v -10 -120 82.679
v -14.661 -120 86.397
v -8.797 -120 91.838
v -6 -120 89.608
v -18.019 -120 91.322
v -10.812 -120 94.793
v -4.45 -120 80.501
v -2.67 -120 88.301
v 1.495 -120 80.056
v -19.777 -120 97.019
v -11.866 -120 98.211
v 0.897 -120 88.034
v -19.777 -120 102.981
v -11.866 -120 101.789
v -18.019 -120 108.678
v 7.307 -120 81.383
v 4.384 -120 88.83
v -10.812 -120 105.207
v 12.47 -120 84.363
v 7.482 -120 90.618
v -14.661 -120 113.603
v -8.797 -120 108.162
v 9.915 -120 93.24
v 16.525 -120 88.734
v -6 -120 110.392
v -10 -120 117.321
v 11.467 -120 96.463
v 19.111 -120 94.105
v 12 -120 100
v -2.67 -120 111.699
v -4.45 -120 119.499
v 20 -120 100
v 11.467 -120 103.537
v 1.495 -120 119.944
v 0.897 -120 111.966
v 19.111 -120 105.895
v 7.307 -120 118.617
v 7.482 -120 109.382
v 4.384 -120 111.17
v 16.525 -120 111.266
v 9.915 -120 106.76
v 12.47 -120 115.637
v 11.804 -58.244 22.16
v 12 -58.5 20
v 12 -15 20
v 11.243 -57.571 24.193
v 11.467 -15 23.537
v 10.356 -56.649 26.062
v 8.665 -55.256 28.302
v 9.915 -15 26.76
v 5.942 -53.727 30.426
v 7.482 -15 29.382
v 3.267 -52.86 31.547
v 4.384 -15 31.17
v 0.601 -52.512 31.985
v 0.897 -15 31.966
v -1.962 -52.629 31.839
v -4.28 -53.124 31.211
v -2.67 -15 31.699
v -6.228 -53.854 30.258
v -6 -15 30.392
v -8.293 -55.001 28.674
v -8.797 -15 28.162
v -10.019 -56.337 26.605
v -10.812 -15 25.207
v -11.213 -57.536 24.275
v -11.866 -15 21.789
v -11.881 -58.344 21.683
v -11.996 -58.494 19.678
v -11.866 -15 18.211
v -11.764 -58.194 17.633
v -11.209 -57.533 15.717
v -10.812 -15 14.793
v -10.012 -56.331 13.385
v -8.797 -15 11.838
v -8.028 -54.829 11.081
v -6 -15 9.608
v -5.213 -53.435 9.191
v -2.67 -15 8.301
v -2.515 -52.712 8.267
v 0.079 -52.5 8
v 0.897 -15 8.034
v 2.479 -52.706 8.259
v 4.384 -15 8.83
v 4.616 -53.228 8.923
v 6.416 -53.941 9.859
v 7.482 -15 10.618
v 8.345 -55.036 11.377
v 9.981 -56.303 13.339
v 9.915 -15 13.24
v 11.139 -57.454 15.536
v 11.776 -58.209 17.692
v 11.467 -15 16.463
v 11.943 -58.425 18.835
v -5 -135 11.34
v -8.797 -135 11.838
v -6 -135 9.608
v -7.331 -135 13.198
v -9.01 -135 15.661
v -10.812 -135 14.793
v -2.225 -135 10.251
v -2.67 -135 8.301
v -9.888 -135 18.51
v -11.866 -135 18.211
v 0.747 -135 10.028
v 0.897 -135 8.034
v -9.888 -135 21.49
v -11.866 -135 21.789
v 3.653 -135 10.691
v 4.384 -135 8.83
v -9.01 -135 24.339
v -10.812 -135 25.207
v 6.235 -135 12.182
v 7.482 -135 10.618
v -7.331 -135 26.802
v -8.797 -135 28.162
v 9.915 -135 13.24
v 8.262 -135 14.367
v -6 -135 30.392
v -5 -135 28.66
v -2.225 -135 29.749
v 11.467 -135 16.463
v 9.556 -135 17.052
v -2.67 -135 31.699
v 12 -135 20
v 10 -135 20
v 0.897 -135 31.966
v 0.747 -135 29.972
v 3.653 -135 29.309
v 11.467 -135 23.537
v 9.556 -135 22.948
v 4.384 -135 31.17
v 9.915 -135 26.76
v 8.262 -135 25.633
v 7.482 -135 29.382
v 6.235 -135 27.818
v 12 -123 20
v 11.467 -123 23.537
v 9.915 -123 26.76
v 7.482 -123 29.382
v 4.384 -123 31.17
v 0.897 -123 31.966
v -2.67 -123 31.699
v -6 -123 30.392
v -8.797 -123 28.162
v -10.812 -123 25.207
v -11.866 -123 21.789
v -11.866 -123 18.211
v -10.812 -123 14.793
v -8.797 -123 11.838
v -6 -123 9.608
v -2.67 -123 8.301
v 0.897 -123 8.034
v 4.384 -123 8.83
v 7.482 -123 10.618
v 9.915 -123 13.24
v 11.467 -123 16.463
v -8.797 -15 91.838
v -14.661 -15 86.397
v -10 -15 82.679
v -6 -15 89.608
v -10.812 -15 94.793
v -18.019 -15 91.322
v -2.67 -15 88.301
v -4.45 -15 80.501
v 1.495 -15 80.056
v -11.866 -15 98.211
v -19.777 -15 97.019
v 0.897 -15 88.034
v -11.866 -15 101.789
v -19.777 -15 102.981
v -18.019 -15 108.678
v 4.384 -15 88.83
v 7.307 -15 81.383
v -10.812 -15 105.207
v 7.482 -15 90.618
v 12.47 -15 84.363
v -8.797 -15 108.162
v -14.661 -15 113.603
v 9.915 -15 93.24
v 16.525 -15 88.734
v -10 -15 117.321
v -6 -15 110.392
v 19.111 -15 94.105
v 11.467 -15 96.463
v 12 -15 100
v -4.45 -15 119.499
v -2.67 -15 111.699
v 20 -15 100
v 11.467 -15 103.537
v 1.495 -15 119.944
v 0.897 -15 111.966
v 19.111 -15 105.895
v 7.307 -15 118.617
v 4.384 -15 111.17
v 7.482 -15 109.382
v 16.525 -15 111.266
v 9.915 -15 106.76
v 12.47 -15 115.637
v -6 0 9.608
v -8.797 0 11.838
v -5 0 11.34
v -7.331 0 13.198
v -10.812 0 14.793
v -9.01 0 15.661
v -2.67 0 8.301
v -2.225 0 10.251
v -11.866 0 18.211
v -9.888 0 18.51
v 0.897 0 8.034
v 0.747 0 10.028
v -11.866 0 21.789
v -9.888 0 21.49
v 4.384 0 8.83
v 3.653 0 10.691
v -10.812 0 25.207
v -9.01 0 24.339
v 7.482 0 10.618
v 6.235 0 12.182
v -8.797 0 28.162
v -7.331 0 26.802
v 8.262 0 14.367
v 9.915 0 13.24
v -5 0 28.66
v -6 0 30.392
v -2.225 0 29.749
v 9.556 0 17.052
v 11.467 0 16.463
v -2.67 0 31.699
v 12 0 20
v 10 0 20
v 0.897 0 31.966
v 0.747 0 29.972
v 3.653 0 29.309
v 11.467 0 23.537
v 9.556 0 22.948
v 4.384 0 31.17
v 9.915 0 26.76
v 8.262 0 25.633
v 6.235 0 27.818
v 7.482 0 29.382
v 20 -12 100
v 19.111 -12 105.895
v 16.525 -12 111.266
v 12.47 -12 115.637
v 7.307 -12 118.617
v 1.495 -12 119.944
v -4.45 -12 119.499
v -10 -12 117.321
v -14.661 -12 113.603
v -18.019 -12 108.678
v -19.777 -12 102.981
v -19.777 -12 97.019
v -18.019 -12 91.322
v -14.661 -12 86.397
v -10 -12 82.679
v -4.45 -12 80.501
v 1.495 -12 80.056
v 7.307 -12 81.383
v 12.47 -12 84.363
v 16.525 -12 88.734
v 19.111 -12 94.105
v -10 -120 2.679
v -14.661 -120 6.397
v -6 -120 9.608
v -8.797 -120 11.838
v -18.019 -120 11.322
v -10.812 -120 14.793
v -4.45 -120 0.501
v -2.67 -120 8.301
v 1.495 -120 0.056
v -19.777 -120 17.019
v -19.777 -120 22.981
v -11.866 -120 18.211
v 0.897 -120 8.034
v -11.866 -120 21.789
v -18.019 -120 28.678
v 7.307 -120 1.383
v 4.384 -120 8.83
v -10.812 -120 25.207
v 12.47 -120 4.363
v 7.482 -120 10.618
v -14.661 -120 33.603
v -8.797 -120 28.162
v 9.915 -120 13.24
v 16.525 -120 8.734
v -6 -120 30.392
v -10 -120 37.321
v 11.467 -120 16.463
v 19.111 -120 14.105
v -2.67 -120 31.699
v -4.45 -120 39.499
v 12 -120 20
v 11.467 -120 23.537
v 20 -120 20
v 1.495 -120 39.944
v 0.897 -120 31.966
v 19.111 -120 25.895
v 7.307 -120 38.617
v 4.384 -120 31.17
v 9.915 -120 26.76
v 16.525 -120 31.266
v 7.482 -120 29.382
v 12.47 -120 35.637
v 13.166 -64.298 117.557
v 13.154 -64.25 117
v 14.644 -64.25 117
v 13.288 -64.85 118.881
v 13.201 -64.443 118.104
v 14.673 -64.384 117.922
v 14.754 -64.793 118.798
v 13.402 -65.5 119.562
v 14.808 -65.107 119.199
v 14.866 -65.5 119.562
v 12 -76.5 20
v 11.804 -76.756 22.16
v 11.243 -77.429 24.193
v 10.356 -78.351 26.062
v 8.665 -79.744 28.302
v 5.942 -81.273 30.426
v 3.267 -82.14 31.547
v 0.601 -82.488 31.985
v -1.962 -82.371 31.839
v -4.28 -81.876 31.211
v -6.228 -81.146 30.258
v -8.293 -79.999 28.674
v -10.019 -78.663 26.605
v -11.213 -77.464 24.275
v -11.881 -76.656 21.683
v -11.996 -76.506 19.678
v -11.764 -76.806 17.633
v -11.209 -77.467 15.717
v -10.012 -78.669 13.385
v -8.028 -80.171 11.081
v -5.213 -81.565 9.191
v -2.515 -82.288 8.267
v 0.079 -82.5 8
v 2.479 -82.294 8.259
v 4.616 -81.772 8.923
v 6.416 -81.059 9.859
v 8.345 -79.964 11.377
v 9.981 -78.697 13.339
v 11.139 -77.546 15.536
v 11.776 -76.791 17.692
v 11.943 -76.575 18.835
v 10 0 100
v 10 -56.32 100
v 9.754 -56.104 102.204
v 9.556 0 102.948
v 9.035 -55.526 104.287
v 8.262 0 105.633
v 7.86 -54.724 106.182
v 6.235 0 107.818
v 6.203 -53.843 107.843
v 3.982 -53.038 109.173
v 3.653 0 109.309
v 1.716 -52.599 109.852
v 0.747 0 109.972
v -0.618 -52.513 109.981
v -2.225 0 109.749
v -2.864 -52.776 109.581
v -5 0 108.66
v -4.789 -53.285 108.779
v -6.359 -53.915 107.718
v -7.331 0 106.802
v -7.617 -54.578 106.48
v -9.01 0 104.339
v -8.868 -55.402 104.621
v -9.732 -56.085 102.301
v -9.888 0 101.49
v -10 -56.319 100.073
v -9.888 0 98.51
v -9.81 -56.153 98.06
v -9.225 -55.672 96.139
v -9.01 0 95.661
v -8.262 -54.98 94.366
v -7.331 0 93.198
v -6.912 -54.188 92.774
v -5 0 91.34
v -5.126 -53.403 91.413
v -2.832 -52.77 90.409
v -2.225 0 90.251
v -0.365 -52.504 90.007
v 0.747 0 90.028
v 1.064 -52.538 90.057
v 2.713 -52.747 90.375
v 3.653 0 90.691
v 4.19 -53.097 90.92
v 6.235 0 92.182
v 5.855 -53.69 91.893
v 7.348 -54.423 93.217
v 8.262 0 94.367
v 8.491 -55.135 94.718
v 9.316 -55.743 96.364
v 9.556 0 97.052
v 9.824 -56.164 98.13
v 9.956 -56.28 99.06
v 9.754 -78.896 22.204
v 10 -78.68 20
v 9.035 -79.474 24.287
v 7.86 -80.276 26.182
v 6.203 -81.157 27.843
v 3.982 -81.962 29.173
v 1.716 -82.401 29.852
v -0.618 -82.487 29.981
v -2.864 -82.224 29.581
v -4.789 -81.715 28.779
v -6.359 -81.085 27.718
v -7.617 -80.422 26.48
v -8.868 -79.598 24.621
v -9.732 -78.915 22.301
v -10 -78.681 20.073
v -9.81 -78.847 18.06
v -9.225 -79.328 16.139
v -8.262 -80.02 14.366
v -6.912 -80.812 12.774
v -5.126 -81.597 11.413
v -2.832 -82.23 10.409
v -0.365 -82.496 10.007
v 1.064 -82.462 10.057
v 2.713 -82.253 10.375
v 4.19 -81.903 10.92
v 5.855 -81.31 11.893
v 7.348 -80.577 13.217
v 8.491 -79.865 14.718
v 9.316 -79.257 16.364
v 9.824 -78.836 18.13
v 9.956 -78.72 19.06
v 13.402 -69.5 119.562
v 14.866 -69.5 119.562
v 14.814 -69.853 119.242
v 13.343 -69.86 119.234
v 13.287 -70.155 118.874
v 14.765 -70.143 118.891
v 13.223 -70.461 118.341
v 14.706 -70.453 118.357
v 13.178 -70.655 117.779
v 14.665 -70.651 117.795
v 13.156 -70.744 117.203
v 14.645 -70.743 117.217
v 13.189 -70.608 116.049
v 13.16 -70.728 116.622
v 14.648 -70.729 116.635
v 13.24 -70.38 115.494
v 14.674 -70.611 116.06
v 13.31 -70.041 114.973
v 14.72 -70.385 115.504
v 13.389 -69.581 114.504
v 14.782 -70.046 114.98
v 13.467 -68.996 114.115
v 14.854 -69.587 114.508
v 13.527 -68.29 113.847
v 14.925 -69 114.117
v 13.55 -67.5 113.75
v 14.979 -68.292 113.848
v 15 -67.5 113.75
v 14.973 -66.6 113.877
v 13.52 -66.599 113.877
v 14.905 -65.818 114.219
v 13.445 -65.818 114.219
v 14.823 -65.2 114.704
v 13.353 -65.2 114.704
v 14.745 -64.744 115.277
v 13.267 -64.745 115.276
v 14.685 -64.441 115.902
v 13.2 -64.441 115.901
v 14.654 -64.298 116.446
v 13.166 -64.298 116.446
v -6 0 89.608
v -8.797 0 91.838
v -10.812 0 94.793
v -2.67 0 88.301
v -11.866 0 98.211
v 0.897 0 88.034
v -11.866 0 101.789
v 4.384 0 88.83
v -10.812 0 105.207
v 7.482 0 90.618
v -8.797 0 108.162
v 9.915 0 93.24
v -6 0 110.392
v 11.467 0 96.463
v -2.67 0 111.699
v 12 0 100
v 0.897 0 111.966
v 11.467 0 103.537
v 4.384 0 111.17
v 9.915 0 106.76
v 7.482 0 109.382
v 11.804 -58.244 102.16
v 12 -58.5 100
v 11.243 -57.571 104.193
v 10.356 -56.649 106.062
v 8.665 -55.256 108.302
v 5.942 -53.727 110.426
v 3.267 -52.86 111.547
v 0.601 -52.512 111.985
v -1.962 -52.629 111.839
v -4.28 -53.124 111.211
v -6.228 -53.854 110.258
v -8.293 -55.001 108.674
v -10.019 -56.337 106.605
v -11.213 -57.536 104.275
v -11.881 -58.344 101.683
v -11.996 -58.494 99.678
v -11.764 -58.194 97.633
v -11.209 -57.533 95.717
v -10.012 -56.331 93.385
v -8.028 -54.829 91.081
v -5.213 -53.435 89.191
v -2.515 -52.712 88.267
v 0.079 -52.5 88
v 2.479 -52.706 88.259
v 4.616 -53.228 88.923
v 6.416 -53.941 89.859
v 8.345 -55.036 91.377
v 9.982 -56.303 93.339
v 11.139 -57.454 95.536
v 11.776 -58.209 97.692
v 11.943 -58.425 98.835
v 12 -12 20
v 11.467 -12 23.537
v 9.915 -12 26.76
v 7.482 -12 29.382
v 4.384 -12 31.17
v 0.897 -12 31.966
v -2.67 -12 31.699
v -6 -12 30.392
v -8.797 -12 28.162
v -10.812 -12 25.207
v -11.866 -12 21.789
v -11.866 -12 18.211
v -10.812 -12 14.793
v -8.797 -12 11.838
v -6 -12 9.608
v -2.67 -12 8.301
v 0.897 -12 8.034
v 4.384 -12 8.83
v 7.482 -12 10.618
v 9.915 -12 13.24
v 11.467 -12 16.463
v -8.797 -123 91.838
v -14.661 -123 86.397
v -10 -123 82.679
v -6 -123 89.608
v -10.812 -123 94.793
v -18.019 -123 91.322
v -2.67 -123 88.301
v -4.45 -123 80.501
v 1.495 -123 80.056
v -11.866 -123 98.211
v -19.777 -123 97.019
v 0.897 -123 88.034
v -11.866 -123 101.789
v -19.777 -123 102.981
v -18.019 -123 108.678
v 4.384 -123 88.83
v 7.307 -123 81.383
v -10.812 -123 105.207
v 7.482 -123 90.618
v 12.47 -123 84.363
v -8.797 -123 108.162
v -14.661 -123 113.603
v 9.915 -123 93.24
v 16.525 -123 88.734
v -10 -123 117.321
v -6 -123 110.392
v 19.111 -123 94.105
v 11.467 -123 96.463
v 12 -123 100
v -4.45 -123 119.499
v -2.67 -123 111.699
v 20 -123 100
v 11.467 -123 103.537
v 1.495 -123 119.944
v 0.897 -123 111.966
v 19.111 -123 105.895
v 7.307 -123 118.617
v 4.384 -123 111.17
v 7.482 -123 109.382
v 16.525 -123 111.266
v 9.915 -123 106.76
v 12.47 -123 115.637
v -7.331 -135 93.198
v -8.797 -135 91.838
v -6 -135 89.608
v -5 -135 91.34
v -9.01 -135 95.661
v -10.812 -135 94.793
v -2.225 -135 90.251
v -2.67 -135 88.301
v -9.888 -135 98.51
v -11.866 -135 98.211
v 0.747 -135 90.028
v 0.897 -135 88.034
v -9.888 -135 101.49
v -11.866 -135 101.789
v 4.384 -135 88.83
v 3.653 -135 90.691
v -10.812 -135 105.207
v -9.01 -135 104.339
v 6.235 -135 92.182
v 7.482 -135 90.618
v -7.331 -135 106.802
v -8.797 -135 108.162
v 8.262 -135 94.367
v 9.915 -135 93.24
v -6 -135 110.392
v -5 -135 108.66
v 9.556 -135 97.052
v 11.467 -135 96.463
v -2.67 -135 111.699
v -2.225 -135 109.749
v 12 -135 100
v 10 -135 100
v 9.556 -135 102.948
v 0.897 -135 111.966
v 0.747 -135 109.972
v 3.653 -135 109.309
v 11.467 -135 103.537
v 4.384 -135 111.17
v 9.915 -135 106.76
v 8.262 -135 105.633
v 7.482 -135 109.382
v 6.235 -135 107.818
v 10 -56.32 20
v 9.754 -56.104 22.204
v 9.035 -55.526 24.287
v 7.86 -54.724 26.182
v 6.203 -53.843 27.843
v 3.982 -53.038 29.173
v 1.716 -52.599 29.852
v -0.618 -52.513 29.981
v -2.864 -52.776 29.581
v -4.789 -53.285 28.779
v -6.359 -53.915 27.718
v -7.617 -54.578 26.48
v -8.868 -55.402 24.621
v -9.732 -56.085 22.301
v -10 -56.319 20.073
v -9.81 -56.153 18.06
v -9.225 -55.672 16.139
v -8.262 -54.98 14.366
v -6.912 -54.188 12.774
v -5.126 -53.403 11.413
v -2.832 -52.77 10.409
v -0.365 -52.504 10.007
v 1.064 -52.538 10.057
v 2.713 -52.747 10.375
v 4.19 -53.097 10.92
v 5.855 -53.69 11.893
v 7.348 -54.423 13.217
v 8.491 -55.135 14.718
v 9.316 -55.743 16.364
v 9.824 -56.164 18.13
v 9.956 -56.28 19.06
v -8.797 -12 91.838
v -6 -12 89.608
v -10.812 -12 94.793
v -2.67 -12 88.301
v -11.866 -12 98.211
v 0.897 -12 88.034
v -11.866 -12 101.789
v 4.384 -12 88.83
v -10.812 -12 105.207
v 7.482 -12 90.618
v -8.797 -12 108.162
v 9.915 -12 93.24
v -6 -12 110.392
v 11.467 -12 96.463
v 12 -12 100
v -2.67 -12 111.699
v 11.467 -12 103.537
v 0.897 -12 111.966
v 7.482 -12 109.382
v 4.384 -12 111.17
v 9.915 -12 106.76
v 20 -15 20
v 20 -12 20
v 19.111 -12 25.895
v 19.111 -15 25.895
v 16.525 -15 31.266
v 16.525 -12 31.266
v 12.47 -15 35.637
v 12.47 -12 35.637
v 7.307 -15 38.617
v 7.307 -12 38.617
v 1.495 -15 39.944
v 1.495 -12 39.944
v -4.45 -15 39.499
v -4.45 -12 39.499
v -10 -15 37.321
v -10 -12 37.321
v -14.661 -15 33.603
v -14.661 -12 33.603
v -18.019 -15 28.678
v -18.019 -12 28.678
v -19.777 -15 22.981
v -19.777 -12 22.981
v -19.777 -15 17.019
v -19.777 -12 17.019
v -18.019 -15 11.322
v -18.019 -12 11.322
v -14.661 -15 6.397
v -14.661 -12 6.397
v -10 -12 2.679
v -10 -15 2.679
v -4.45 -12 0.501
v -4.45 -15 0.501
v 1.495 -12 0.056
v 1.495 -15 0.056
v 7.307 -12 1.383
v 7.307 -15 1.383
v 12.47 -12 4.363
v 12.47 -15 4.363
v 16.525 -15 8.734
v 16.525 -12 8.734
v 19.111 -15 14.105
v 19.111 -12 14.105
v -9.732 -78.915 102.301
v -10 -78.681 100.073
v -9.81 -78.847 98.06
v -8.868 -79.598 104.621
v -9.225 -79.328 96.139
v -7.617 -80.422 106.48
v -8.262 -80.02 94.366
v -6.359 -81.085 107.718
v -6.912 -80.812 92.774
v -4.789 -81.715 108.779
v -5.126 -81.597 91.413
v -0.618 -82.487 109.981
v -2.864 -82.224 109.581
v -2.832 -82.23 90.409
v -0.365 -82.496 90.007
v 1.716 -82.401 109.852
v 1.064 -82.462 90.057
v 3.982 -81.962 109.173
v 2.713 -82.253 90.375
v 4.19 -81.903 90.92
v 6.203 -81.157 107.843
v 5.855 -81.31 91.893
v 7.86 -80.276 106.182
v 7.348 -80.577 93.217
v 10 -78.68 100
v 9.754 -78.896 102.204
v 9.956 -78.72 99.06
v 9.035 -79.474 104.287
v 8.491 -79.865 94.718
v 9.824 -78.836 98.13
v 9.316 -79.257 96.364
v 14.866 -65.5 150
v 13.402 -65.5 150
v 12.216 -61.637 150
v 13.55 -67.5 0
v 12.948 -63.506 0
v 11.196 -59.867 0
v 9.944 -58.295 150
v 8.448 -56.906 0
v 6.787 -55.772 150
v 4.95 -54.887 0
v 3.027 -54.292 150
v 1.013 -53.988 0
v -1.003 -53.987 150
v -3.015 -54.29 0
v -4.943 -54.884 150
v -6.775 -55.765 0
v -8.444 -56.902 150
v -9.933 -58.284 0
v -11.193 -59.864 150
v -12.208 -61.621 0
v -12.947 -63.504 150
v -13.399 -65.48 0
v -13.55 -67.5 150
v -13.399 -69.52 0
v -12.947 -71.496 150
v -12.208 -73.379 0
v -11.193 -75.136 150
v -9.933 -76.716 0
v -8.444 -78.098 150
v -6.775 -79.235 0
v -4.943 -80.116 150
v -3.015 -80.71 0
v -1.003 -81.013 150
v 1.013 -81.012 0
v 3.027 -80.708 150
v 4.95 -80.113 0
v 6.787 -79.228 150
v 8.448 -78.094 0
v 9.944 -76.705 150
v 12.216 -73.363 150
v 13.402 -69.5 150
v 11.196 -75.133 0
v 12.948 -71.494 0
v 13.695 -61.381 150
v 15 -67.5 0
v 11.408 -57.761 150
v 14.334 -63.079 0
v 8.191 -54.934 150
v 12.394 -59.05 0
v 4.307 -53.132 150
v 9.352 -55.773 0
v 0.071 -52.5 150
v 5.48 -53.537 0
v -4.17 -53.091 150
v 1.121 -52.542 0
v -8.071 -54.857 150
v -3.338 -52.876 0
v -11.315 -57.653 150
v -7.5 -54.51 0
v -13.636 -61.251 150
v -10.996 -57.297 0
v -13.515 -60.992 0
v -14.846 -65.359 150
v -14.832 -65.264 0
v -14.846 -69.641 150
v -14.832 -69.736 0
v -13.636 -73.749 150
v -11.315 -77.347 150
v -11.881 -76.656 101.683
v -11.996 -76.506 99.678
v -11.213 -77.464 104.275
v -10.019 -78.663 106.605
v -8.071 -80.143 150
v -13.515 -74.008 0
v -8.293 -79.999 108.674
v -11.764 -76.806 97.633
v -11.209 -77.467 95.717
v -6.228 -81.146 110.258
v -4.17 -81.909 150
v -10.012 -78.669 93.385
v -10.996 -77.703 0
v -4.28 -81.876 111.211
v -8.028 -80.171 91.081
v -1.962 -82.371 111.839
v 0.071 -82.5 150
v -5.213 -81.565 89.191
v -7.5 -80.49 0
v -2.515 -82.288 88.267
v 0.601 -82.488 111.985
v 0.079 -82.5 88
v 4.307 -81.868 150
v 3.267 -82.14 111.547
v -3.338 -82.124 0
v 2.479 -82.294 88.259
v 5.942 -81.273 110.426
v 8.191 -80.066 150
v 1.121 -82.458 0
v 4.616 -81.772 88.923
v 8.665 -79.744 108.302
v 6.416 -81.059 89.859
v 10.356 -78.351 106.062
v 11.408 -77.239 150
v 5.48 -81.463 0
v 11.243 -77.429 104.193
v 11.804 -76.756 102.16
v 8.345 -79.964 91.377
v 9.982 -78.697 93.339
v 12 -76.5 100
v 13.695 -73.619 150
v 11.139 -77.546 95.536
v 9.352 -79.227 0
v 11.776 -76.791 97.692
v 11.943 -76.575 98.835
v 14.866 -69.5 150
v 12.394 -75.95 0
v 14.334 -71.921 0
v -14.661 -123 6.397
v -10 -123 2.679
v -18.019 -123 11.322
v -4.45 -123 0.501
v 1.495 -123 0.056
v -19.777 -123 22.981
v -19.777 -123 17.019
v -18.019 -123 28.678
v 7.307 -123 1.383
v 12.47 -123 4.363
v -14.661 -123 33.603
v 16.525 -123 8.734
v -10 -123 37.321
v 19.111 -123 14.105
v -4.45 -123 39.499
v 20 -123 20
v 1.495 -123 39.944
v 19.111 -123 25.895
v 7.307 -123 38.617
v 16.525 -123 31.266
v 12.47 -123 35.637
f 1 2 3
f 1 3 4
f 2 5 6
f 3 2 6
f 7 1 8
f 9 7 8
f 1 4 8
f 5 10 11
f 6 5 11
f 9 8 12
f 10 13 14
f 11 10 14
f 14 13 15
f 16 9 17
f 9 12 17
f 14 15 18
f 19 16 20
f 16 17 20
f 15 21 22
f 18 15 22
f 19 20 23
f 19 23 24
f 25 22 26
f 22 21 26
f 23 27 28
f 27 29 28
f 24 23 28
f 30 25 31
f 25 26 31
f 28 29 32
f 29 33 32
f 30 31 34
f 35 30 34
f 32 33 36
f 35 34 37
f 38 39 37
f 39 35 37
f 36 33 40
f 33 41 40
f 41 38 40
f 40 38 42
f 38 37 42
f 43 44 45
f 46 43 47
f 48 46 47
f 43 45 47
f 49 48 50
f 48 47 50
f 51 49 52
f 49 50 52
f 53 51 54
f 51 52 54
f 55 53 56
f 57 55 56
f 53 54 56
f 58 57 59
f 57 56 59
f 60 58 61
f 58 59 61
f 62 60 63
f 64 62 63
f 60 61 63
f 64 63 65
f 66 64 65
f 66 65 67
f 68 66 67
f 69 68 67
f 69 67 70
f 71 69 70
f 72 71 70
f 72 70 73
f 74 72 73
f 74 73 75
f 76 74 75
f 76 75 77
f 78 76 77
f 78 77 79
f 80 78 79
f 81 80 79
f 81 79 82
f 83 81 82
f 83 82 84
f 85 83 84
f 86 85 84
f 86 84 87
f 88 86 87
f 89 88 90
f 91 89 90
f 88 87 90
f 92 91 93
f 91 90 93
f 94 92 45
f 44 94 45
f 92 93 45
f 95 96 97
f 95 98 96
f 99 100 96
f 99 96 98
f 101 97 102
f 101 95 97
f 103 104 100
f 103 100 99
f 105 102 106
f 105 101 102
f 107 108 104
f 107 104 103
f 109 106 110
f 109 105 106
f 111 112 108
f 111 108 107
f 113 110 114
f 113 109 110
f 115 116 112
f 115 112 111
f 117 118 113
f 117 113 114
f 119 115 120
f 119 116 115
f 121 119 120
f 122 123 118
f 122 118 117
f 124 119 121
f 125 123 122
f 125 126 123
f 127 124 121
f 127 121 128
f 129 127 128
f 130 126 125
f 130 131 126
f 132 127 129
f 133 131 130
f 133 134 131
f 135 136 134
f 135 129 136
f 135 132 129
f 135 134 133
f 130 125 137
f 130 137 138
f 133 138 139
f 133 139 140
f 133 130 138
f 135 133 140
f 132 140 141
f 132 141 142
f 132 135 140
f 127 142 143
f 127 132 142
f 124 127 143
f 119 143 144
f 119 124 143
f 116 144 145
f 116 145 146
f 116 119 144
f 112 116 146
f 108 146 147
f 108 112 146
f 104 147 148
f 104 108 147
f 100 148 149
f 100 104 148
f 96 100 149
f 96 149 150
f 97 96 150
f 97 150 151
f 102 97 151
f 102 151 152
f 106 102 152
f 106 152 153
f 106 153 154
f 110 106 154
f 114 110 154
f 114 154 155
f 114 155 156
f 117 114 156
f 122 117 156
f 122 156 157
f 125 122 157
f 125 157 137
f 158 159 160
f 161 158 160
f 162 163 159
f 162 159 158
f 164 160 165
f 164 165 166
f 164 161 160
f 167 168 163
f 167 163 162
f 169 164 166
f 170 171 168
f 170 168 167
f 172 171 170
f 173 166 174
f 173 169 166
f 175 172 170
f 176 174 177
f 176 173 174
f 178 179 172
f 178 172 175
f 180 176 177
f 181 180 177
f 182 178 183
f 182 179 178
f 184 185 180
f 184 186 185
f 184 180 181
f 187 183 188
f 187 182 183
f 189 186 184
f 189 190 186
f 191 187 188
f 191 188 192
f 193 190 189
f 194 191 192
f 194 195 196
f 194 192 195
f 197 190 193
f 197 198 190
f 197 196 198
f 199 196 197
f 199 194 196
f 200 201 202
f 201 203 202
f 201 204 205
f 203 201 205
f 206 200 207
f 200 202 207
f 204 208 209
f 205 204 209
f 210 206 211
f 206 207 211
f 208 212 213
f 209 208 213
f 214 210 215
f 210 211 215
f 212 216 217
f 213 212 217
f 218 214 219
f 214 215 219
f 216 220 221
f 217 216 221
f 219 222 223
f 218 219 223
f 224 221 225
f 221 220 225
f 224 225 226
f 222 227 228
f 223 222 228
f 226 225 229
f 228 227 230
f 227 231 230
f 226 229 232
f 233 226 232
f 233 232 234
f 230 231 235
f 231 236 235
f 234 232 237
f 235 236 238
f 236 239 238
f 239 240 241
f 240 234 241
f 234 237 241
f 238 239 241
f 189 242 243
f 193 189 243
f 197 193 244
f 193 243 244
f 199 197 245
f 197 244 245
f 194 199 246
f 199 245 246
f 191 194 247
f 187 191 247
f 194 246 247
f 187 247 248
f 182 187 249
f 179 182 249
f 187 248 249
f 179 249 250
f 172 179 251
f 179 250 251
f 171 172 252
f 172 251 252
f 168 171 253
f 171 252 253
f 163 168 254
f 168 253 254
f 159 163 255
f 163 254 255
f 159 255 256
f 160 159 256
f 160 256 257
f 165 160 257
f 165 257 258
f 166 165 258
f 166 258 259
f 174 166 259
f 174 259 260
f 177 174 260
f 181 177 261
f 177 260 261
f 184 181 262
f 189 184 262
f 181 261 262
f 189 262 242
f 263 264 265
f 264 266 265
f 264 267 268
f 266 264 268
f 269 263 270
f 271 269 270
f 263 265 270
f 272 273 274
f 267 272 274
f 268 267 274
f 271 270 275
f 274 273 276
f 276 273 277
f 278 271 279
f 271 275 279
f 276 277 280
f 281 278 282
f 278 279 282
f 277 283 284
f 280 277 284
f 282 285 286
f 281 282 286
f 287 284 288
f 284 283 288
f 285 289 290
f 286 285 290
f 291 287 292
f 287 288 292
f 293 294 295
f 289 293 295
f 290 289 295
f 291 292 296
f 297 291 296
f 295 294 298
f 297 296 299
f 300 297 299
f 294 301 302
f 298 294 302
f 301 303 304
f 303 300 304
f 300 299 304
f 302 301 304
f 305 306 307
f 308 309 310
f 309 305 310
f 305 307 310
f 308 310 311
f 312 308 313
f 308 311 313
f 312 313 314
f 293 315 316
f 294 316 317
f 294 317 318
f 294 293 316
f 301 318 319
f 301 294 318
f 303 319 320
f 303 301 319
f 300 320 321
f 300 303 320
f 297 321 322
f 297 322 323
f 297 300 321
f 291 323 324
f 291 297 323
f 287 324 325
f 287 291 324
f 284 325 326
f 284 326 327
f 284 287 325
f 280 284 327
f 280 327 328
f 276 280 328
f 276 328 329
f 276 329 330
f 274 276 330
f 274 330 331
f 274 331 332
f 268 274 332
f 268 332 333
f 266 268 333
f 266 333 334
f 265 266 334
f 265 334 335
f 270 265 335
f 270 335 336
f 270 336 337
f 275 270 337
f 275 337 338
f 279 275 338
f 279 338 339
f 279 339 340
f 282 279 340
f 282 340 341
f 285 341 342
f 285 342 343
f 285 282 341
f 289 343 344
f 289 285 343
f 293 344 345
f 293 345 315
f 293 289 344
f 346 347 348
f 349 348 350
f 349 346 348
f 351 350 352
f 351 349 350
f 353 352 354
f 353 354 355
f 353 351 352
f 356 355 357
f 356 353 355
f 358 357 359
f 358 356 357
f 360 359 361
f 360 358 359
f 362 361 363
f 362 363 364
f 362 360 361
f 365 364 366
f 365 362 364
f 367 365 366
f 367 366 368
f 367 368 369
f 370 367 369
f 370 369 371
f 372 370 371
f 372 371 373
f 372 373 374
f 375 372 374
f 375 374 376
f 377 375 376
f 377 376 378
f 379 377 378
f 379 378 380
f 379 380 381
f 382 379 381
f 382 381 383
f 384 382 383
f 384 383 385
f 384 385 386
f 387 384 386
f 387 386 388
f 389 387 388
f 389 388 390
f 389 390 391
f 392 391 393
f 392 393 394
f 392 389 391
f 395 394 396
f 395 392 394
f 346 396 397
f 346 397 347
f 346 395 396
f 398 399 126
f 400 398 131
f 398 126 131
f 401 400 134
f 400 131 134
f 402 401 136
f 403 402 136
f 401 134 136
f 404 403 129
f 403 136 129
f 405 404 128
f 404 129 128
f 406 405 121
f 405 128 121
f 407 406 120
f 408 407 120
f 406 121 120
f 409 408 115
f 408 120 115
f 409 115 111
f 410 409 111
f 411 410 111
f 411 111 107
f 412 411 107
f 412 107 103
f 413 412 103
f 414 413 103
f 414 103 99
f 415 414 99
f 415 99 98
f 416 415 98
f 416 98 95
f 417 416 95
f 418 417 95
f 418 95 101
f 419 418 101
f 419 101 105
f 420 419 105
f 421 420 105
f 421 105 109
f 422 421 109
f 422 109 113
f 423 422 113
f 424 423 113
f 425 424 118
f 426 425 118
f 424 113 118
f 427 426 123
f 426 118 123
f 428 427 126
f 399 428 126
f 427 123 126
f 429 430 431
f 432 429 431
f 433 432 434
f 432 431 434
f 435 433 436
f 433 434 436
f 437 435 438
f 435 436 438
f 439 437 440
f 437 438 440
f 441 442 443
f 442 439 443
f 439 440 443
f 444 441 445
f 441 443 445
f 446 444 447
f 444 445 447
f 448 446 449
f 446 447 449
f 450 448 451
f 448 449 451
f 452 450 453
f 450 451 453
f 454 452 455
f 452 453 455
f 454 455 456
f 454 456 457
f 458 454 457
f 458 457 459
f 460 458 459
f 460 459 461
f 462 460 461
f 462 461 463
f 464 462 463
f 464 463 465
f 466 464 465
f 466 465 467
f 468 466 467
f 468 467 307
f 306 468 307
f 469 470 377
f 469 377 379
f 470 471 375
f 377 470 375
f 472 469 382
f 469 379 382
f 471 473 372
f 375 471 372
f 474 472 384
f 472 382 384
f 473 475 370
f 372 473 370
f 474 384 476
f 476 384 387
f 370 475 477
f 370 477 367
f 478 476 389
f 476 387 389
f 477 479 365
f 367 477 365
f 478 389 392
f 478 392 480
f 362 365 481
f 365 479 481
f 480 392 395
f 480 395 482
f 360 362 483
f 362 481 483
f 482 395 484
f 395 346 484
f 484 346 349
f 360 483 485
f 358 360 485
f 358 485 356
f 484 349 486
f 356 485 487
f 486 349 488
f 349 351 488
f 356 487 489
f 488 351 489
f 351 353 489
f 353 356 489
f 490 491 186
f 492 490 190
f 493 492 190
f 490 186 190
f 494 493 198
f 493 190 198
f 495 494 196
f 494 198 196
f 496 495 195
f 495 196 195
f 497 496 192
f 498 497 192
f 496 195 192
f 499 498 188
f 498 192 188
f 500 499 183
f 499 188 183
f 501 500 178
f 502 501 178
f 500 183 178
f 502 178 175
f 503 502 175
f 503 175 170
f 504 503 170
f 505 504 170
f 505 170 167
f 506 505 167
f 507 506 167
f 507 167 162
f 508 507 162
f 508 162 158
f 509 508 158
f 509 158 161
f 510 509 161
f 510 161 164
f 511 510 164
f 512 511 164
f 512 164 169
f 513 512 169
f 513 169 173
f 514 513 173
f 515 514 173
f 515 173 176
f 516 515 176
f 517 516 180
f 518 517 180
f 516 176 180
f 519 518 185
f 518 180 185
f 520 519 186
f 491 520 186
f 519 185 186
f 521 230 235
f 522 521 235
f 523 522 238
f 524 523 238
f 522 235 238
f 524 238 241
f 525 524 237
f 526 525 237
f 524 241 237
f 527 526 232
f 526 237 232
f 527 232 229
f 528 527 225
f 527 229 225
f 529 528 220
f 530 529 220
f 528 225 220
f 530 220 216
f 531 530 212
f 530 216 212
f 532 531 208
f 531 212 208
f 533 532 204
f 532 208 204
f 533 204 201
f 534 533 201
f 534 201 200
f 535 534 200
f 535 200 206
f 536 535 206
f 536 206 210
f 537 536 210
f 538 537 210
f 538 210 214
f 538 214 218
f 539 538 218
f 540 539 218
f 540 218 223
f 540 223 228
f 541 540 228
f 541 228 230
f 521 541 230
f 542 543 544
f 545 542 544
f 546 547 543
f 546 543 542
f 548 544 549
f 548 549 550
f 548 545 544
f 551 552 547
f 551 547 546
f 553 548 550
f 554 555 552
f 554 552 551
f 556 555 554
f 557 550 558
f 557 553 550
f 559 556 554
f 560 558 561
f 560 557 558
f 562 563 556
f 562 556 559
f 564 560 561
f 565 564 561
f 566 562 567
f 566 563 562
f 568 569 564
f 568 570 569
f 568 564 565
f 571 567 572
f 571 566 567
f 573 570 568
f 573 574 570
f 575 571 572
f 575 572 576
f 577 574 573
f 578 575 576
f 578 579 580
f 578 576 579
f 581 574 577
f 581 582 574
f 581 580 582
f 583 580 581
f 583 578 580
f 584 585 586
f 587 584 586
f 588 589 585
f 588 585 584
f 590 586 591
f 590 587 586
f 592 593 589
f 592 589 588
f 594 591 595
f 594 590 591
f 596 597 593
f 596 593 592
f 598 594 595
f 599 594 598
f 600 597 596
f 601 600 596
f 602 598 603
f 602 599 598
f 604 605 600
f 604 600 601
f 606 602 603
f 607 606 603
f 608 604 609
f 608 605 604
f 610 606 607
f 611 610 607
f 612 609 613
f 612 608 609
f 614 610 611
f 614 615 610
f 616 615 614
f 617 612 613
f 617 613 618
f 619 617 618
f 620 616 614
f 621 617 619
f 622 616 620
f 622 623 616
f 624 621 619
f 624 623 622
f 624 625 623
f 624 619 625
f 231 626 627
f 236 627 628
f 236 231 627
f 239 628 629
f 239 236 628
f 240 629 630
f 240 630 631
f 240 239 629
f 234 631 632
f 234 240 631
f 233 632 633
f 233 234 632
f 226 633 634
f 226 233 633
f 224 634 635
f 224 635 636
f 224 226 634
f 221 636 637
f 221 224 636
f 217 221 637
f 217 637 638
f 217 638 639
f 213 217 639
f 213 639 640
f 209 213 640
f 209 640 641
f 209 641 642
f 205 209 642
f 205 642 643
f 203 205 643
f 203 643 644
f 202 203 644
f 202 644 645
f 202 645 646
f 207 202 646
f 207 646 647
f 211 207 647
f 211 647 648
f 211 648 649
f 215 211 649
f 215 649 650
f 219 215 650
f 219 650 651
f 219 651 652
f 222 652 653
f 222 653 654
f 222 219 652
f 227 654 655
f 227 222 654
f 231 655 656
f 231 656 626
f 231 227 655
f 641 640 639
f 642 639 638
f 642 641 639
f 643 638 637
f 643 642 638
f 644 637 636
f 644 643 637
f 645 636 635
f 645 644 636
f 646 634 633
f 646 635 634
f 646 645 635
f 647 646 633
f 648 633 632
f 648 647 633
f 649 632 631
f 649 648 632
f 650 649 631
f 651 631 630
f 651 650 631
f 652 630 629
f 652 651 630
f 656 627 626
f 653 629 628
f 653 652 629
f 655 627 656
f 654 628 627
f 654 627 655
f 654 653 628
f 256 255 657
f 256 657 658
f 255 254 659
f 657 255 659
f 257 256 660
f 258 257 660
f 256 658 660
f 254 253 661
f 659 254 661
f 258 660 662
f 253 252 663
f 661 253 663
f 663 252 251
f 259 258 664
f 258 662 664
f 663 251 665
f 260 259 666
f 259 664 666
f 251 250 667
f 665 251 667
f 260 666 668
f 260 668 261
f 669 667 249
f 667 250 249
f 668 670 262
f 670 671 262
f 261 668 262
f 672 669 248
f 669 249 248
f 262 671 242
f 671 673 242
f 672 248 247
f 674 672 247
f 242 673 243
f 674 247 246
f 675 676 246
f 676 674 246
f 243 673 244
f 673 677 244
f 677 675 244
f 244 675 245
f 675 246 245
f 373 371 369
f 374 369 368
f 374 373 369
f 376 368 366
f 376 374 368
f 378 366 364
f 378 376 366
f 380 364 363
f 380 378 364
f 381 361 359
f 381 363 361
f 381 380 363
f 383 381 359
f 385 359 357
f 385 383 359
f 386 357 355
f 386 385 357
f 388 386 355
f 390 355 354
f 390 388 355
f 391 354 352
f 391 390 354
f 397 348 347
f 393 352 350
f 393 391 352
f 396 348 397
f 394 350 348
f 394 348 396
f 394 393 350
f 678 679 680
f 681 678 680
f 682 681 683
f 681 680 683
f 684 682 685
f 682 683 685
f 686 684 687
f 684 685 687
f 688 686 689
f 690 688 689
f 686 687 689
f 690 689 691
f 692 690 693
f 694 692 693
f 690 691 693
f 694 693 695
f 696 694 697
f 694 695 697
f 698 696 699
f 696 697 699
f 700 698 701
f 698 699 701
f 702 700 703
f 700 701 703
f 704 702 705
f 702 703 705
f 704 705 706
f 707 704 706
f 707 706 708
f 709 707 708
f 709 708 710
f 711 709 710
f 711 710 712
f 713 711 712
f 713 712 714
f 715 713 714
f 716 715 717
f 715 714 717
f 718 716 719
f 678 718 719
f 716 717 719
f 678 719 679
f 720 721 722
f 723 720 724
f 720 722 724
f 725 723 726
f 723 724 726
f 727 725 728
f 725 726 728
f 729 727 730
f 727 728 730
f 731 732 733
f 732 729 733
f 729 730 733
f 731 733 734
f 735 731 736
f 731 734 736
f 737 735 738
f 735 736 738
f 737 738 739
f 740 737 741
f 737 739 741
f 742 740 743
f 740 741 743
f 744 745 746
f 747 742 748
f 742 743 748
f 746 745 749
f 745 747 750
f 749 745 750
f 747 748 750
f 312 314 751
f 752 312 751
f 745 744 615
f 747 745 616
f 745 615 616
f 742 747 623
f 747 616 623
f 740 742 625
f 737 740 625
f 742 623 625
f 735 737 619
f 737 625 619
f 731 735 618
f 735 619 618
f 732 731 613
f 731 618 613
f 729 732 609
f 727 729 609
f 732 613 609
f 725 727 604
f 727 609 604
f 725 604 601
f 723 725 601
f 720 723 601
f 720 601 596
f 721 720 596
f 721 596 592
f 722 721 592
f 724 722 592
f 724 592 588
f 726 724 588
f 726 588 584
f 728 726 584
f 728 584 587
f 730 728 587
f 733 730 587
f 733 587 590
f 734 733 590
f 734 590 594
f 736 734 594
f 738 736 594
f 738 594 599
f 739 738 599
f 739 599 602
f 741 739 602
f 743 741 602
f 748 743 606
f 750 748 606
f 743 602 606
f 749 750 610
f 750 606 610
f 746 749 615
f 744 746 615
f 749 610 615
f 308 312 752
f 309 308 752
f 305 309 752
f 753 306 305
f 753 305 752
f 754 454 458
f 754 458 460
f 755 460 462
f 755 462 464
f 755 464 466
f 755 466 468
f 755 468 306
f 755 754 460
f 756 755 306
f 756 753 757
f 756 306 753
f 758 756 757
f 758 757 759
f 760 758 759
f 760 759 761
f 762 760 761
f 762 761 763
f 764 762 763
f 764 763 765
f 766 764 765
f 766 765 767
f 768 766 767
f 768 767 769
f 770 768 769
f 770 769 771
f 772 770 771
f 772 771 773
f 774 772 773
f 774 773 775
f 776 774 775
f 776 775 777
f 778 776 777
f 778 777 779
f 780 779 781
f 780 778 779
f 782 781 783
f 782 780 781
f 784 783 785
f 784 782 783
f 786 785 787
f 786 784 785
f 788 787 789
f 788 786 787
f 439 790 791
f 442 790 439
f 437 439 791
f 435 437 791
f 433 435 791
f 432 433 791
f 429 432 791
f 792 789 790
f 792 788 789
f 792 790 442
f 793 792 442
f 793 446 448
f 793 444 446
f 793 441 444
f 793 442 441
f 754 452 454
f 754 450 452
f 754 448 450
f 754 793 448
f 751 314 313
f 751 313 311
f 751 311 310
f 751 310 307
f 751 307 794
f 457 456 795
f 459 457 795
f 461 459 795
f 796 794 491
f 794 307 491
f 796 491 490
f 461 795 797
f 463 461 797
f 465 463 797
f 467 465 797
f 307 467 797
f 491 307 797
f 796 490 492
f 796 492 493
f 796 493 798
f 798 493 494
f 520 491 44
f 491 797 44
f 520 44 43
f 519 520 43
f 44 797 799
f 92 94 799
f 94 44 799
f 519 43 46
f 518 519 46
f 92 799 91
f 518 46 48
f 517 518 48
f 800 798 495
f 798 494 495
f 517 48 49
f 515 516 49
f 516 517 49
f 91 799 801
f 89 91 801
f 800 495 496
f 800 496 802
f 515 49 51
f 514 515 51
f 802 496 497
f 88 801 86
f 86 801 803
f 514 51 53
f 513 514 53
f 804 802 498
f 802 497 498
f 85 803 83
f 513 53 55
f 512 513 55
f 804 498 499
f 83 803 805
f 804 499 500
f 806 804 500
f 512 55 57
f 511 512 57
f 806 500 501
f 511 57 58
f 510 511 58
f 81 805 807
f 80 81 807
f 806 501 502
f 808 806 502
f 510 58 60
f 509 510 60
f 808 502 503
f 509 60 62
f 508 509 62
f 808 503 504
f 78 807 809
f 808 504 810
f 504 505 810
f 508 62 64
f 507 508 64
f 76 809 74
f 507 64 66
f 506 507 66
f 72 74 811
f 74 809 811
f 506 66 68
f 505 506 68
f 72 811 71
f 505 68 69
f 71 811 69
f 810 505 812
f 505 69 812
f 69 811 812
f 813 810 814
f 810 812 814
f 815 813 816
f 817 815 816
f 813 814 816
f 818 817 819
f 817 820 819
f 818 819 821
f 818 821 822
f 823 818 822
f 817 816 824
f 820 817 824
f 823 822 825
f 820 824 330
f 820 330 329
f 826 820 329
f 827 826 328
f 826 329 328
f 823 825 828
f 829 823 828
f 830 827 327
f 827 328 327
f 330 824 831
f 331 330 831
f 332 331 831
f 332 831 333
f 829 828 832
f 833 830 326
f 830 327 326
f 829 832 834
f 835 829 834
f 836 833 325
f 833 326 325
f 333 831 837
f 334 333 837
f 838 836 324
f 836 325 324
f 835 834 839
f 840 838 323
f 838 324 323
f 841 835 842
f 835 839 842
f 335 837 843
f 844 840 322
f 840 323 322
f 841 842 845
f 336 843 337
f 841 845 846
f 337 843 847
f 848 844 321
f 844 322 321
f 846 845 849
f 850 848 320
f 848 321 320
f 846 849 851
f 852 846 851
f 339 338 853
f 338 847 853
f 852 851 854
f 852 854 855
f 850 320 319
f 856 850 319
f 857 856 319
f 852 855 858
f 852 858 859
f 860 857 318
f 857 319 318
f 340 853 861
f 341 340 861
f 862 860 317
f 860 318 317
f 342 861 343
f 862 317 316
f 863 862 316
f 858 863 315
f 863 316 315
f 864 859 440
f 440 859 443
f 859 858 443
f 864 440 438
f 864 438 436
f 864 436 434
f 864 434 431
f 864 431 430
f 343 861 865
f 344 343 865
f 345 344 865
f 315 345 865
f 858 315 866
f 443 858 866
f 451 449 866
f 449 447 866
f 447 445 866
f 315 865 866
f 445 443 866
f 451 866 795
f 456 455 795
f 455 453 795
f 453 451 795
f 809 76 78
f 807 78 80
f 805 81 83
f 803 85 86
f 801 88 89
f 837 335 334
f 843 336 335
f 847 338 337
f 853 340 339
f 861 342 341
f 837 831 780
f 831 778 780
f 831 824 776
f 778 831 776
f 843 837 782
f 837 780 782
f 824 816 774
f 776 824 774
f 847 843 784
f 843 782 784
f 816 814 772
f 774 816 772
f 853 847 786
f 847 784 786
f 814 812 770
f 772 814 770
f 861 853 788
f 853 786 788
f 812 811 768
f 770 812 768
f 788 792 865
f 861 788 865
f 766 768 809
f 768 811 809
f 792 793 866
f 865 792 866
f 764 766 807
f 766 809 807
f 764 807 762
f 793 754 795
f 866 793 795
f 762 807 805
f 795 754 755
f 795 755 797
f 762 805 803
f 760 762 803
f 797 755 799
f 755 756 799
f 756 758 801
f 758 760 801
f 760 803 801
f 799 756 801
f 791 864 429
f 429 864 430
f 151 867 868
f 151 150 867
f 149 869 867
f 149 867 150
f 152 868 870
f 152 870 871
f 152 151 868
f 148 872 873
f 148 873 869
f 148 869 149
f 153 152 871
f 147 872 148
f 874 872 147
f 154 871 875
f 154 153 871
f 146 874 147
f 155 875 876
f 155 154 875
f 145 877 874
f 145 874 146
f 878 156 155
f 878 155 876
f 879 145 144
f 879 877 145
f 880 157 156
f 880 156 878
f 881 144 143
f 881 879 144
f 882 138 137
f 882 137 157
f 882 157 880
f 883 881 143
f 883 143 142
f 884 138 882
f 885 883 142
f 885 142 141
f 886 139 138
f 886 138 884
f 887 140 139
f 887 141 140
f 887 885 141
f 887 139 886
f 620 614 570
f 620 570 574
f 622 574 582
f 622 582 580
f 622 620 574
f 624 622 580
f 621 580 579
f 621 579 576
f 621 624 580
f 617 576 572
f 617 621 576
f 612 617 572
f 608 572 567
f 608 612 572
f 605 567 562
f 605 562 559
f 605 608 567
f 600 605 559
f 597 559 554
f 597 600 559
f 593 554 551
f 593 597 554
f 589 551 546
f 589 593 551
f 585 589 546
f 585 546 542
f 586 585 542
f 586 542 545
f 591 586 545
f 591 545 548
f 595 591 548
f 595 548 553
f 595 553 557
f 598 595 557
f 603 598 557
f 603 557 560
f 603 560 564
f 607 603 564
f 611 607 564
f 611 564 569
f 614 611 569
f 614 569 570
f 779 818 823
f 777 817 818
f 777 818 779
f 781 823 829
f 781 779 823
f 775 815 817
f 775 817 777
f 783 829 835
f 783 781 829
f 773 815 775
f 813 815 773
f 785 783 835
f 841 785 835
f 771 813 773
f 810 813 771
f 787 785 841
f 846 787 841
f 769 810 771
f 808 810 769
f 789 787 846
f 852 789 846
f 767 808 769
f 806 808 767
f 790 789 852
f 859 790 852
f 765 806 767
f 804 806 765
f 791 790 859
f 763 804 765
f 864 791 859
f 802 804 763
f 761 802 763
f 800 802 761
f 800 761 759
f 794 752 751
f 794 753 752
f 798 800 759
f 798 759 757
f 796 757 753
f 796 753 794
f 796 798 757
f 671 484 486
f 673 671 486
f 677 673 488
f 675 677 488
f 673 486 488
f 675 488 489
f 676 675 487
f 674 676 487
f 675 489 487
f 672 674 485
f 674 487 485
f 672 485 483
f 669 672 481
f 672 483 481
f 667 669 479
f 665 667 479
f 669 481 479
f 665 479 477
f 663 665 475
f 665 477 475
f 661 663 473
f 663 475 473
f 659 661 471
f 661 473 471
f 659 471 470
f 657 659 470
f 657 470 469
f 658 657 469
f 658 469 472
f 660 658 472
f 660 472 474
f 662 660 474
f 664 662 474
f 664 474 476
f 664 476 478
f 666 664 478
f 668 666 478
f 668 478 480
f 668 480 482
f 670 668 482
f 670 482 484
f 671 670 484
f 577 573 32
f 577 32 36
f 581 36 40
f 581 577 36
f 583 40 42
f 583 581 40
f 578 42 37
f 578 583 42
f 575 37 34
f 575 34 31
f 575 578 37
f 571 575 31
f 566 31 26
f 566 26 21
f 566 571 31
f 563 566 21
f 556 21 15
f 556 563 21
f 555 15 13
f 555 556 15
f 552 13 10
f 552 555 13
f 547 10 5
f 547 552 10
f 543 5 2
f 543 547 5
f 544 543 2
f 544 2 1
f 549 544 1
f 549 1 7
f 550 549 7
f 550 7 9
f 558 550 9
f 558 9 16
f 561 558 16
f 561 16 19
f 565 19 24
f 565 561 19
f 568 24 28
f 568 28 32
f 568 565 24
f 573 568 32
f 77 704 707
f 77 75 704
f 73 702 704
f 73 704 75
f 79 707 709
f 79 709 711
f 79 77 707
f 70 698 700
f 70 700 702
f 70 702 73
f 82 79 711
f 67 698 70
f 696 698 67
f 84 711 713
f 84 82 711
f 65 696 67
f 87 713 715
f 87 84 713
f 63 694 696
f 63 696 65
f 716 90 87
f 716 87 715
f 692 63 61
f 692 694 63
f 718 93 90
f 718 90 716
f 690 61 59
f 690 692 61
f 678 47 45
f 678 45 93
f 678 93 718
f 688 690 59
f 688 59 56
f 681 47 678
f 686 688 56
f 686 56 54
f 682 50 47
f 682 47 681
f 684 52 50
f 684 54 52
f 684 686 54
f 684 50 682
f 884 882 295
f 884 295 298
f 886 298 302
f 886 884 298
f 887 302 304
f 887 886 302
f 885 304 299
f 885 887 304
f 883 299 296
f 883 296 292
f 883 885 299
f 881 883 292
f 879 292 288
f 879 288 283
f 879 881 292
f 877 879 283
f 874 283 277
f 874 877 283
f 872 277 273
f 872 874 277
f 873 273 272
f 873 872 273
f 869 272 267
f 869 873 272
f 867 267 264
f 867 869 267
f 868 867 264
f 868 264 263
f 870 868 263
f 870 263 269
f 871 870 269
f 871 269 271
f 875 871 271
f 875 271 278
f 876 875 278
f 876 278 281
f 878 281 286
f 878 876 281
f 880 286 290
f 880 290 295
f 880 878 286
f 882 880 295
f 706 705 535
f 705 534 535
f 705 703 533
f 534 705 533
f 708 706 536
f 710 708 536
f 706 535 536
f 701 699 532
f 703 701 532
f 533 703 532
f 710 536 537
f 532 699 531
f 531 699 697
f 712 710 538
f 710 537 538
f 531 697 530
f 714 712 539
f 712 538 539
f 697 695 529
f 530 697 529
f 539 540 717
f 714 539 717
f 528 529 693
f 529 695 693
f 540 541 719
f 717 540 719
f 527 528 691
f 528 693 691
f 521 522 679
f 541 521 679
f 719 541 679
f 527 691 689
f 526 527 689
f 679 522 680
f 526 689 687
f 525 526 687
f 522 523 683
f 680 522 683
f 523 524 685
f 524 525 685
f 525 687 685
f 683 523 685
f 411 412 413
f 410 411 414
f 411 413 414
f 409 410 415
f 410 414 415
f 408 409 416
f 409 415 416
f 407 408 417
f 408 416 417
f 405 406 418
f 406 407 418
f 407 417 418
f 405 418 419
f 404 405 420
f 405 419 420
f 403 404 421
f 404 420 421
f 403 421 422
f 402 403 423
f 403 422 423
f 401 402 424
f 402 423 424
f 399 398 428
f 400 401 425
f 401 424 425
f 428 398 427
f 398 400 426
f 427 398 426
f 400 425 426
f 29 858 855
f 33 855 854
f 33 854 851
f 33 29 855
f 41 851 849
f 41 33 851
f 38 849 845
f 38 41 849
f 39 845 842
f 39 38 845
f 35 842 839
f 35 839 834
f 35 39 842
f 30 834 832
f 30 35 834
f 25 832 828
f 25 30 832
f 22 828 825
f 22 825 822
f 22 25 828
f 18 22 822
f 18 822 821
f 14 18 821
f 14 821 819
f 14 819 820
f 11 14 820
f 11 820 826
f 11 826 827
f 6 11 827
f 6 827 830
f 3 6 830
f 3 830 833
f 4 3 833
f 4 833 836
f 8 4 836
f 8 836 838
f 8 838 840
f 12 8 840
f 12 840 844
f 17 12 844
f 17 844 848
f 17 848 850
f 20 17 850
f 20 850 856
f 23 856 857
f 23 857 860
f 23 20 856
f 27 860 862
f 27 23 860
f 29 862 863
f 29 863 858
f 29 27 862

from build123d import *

# Parameters (mm, degrees)
F4_R      = 15
F4_R_2    = 13.55
F6_DEPTH  = 150
F5_R      = 12
F5_R_2    = 10
F10_DEPTH = 4
F11_START = -12
F5_R_3    = 20
F11_DEPTH = 3


with BuildPart() as f6:
    # F4 (on Top) → F6 (new body, through all)
    with BuildSketch(Plane.XY):
        with Locations((0, -67.5)):
            Circle(F4_R)
        with Locations((0, -67.5)):
            Circle(F4_R_2, mode=Mode.SUBTRACT)
    extrude(amount=F6_DEPTH)

    # F5 (on offset) → F7 (join, up to the next surface of F6)
    with BuildSketch(Plane.XZ.offset(135)):
        with Locations((0, 100)):
            Circle(F5_R)
        with Locations((0, 100)):
            Circle(F5_R_2, mode=Mode.SUBTRACT)
        with Locations((0, 20)):
            Circle(F5_R)
        with Locations((0, 20)):
            Circle(F5_R_2, mode=Mode.SUBTRACT)
    extrude(until=Until.NEXT, dir=(0, 1, 0))

    # F9 (on plane+point) → F10 (cut)
    with BuildSketch(Plane.YZ.offset(15)):
        with BuildLine():
            ThreePointArc((-69.5, 119.5617376915), (-67.5, 120.25), (-65.5, 119.5617376915))
            Line((-65.5, 119.5617376915), (-65.5, 150))
            Line((-65.5, 150), (-69.5, 150))
            Line((-69.5, 150), (-69.5, 119.5617376915))
        make_face()
        with BuildLine():
            ThreePointArc((-69.5, 119.5617376915), (-68.9252192814, 114.0791696386), (-64.25, 117))
            ThreePointArc((-64.25, 117), (-64.5791696386, 118.4252192814), (-65.5, 119.5617376915))
            Line((-65.5, 119.5617376915), (-65.5, 117))
            Line((-65.5, 117), (-69.5, 117))
            Line((-69.5, 117), (-69.5, 119.5617376915))
        make_face()
        with BuildLine():
            Line((-65.5, 117), (-65.5, 119.5617376915))
            ThreePointArc((-65.5, 119.5617376915), (-67.5, 120.25), (-69.5, 119.5617376915))
            Line((-69.5, 119.5617376915), (-69.5, 117))
            Line((-69.5, 117), (-65.5, 117))
        make_face()
    extrude(amount=-F10_DEPTH, mode=Mode.SUBTRACT)

    # F5 (on offset) → F11 (join)
    with BuildSketch(Plane.XZ.offset(135).offset(F11_START)):
        with Locations((0, 100)):
            Circle(F5_R_3)
        with Locations((0, 100)):
            Circle(F5_R, mode=Mode.SUBTRACT)
        with Locations((0, 20)):
            Circle(F5_R_3)
        with Locations((0, 20)):
            Circle(F5_R, mode=Mode.SUBTRACT)
    extrude(amount=-F11_DEPTH)

    # F12: F6 across plane


with BuildPart() as f6_1:
    add(f6.part)
    add(f6.part.mirror(Plane.XZ.offset(67.5)))


solid = f6_1.part
